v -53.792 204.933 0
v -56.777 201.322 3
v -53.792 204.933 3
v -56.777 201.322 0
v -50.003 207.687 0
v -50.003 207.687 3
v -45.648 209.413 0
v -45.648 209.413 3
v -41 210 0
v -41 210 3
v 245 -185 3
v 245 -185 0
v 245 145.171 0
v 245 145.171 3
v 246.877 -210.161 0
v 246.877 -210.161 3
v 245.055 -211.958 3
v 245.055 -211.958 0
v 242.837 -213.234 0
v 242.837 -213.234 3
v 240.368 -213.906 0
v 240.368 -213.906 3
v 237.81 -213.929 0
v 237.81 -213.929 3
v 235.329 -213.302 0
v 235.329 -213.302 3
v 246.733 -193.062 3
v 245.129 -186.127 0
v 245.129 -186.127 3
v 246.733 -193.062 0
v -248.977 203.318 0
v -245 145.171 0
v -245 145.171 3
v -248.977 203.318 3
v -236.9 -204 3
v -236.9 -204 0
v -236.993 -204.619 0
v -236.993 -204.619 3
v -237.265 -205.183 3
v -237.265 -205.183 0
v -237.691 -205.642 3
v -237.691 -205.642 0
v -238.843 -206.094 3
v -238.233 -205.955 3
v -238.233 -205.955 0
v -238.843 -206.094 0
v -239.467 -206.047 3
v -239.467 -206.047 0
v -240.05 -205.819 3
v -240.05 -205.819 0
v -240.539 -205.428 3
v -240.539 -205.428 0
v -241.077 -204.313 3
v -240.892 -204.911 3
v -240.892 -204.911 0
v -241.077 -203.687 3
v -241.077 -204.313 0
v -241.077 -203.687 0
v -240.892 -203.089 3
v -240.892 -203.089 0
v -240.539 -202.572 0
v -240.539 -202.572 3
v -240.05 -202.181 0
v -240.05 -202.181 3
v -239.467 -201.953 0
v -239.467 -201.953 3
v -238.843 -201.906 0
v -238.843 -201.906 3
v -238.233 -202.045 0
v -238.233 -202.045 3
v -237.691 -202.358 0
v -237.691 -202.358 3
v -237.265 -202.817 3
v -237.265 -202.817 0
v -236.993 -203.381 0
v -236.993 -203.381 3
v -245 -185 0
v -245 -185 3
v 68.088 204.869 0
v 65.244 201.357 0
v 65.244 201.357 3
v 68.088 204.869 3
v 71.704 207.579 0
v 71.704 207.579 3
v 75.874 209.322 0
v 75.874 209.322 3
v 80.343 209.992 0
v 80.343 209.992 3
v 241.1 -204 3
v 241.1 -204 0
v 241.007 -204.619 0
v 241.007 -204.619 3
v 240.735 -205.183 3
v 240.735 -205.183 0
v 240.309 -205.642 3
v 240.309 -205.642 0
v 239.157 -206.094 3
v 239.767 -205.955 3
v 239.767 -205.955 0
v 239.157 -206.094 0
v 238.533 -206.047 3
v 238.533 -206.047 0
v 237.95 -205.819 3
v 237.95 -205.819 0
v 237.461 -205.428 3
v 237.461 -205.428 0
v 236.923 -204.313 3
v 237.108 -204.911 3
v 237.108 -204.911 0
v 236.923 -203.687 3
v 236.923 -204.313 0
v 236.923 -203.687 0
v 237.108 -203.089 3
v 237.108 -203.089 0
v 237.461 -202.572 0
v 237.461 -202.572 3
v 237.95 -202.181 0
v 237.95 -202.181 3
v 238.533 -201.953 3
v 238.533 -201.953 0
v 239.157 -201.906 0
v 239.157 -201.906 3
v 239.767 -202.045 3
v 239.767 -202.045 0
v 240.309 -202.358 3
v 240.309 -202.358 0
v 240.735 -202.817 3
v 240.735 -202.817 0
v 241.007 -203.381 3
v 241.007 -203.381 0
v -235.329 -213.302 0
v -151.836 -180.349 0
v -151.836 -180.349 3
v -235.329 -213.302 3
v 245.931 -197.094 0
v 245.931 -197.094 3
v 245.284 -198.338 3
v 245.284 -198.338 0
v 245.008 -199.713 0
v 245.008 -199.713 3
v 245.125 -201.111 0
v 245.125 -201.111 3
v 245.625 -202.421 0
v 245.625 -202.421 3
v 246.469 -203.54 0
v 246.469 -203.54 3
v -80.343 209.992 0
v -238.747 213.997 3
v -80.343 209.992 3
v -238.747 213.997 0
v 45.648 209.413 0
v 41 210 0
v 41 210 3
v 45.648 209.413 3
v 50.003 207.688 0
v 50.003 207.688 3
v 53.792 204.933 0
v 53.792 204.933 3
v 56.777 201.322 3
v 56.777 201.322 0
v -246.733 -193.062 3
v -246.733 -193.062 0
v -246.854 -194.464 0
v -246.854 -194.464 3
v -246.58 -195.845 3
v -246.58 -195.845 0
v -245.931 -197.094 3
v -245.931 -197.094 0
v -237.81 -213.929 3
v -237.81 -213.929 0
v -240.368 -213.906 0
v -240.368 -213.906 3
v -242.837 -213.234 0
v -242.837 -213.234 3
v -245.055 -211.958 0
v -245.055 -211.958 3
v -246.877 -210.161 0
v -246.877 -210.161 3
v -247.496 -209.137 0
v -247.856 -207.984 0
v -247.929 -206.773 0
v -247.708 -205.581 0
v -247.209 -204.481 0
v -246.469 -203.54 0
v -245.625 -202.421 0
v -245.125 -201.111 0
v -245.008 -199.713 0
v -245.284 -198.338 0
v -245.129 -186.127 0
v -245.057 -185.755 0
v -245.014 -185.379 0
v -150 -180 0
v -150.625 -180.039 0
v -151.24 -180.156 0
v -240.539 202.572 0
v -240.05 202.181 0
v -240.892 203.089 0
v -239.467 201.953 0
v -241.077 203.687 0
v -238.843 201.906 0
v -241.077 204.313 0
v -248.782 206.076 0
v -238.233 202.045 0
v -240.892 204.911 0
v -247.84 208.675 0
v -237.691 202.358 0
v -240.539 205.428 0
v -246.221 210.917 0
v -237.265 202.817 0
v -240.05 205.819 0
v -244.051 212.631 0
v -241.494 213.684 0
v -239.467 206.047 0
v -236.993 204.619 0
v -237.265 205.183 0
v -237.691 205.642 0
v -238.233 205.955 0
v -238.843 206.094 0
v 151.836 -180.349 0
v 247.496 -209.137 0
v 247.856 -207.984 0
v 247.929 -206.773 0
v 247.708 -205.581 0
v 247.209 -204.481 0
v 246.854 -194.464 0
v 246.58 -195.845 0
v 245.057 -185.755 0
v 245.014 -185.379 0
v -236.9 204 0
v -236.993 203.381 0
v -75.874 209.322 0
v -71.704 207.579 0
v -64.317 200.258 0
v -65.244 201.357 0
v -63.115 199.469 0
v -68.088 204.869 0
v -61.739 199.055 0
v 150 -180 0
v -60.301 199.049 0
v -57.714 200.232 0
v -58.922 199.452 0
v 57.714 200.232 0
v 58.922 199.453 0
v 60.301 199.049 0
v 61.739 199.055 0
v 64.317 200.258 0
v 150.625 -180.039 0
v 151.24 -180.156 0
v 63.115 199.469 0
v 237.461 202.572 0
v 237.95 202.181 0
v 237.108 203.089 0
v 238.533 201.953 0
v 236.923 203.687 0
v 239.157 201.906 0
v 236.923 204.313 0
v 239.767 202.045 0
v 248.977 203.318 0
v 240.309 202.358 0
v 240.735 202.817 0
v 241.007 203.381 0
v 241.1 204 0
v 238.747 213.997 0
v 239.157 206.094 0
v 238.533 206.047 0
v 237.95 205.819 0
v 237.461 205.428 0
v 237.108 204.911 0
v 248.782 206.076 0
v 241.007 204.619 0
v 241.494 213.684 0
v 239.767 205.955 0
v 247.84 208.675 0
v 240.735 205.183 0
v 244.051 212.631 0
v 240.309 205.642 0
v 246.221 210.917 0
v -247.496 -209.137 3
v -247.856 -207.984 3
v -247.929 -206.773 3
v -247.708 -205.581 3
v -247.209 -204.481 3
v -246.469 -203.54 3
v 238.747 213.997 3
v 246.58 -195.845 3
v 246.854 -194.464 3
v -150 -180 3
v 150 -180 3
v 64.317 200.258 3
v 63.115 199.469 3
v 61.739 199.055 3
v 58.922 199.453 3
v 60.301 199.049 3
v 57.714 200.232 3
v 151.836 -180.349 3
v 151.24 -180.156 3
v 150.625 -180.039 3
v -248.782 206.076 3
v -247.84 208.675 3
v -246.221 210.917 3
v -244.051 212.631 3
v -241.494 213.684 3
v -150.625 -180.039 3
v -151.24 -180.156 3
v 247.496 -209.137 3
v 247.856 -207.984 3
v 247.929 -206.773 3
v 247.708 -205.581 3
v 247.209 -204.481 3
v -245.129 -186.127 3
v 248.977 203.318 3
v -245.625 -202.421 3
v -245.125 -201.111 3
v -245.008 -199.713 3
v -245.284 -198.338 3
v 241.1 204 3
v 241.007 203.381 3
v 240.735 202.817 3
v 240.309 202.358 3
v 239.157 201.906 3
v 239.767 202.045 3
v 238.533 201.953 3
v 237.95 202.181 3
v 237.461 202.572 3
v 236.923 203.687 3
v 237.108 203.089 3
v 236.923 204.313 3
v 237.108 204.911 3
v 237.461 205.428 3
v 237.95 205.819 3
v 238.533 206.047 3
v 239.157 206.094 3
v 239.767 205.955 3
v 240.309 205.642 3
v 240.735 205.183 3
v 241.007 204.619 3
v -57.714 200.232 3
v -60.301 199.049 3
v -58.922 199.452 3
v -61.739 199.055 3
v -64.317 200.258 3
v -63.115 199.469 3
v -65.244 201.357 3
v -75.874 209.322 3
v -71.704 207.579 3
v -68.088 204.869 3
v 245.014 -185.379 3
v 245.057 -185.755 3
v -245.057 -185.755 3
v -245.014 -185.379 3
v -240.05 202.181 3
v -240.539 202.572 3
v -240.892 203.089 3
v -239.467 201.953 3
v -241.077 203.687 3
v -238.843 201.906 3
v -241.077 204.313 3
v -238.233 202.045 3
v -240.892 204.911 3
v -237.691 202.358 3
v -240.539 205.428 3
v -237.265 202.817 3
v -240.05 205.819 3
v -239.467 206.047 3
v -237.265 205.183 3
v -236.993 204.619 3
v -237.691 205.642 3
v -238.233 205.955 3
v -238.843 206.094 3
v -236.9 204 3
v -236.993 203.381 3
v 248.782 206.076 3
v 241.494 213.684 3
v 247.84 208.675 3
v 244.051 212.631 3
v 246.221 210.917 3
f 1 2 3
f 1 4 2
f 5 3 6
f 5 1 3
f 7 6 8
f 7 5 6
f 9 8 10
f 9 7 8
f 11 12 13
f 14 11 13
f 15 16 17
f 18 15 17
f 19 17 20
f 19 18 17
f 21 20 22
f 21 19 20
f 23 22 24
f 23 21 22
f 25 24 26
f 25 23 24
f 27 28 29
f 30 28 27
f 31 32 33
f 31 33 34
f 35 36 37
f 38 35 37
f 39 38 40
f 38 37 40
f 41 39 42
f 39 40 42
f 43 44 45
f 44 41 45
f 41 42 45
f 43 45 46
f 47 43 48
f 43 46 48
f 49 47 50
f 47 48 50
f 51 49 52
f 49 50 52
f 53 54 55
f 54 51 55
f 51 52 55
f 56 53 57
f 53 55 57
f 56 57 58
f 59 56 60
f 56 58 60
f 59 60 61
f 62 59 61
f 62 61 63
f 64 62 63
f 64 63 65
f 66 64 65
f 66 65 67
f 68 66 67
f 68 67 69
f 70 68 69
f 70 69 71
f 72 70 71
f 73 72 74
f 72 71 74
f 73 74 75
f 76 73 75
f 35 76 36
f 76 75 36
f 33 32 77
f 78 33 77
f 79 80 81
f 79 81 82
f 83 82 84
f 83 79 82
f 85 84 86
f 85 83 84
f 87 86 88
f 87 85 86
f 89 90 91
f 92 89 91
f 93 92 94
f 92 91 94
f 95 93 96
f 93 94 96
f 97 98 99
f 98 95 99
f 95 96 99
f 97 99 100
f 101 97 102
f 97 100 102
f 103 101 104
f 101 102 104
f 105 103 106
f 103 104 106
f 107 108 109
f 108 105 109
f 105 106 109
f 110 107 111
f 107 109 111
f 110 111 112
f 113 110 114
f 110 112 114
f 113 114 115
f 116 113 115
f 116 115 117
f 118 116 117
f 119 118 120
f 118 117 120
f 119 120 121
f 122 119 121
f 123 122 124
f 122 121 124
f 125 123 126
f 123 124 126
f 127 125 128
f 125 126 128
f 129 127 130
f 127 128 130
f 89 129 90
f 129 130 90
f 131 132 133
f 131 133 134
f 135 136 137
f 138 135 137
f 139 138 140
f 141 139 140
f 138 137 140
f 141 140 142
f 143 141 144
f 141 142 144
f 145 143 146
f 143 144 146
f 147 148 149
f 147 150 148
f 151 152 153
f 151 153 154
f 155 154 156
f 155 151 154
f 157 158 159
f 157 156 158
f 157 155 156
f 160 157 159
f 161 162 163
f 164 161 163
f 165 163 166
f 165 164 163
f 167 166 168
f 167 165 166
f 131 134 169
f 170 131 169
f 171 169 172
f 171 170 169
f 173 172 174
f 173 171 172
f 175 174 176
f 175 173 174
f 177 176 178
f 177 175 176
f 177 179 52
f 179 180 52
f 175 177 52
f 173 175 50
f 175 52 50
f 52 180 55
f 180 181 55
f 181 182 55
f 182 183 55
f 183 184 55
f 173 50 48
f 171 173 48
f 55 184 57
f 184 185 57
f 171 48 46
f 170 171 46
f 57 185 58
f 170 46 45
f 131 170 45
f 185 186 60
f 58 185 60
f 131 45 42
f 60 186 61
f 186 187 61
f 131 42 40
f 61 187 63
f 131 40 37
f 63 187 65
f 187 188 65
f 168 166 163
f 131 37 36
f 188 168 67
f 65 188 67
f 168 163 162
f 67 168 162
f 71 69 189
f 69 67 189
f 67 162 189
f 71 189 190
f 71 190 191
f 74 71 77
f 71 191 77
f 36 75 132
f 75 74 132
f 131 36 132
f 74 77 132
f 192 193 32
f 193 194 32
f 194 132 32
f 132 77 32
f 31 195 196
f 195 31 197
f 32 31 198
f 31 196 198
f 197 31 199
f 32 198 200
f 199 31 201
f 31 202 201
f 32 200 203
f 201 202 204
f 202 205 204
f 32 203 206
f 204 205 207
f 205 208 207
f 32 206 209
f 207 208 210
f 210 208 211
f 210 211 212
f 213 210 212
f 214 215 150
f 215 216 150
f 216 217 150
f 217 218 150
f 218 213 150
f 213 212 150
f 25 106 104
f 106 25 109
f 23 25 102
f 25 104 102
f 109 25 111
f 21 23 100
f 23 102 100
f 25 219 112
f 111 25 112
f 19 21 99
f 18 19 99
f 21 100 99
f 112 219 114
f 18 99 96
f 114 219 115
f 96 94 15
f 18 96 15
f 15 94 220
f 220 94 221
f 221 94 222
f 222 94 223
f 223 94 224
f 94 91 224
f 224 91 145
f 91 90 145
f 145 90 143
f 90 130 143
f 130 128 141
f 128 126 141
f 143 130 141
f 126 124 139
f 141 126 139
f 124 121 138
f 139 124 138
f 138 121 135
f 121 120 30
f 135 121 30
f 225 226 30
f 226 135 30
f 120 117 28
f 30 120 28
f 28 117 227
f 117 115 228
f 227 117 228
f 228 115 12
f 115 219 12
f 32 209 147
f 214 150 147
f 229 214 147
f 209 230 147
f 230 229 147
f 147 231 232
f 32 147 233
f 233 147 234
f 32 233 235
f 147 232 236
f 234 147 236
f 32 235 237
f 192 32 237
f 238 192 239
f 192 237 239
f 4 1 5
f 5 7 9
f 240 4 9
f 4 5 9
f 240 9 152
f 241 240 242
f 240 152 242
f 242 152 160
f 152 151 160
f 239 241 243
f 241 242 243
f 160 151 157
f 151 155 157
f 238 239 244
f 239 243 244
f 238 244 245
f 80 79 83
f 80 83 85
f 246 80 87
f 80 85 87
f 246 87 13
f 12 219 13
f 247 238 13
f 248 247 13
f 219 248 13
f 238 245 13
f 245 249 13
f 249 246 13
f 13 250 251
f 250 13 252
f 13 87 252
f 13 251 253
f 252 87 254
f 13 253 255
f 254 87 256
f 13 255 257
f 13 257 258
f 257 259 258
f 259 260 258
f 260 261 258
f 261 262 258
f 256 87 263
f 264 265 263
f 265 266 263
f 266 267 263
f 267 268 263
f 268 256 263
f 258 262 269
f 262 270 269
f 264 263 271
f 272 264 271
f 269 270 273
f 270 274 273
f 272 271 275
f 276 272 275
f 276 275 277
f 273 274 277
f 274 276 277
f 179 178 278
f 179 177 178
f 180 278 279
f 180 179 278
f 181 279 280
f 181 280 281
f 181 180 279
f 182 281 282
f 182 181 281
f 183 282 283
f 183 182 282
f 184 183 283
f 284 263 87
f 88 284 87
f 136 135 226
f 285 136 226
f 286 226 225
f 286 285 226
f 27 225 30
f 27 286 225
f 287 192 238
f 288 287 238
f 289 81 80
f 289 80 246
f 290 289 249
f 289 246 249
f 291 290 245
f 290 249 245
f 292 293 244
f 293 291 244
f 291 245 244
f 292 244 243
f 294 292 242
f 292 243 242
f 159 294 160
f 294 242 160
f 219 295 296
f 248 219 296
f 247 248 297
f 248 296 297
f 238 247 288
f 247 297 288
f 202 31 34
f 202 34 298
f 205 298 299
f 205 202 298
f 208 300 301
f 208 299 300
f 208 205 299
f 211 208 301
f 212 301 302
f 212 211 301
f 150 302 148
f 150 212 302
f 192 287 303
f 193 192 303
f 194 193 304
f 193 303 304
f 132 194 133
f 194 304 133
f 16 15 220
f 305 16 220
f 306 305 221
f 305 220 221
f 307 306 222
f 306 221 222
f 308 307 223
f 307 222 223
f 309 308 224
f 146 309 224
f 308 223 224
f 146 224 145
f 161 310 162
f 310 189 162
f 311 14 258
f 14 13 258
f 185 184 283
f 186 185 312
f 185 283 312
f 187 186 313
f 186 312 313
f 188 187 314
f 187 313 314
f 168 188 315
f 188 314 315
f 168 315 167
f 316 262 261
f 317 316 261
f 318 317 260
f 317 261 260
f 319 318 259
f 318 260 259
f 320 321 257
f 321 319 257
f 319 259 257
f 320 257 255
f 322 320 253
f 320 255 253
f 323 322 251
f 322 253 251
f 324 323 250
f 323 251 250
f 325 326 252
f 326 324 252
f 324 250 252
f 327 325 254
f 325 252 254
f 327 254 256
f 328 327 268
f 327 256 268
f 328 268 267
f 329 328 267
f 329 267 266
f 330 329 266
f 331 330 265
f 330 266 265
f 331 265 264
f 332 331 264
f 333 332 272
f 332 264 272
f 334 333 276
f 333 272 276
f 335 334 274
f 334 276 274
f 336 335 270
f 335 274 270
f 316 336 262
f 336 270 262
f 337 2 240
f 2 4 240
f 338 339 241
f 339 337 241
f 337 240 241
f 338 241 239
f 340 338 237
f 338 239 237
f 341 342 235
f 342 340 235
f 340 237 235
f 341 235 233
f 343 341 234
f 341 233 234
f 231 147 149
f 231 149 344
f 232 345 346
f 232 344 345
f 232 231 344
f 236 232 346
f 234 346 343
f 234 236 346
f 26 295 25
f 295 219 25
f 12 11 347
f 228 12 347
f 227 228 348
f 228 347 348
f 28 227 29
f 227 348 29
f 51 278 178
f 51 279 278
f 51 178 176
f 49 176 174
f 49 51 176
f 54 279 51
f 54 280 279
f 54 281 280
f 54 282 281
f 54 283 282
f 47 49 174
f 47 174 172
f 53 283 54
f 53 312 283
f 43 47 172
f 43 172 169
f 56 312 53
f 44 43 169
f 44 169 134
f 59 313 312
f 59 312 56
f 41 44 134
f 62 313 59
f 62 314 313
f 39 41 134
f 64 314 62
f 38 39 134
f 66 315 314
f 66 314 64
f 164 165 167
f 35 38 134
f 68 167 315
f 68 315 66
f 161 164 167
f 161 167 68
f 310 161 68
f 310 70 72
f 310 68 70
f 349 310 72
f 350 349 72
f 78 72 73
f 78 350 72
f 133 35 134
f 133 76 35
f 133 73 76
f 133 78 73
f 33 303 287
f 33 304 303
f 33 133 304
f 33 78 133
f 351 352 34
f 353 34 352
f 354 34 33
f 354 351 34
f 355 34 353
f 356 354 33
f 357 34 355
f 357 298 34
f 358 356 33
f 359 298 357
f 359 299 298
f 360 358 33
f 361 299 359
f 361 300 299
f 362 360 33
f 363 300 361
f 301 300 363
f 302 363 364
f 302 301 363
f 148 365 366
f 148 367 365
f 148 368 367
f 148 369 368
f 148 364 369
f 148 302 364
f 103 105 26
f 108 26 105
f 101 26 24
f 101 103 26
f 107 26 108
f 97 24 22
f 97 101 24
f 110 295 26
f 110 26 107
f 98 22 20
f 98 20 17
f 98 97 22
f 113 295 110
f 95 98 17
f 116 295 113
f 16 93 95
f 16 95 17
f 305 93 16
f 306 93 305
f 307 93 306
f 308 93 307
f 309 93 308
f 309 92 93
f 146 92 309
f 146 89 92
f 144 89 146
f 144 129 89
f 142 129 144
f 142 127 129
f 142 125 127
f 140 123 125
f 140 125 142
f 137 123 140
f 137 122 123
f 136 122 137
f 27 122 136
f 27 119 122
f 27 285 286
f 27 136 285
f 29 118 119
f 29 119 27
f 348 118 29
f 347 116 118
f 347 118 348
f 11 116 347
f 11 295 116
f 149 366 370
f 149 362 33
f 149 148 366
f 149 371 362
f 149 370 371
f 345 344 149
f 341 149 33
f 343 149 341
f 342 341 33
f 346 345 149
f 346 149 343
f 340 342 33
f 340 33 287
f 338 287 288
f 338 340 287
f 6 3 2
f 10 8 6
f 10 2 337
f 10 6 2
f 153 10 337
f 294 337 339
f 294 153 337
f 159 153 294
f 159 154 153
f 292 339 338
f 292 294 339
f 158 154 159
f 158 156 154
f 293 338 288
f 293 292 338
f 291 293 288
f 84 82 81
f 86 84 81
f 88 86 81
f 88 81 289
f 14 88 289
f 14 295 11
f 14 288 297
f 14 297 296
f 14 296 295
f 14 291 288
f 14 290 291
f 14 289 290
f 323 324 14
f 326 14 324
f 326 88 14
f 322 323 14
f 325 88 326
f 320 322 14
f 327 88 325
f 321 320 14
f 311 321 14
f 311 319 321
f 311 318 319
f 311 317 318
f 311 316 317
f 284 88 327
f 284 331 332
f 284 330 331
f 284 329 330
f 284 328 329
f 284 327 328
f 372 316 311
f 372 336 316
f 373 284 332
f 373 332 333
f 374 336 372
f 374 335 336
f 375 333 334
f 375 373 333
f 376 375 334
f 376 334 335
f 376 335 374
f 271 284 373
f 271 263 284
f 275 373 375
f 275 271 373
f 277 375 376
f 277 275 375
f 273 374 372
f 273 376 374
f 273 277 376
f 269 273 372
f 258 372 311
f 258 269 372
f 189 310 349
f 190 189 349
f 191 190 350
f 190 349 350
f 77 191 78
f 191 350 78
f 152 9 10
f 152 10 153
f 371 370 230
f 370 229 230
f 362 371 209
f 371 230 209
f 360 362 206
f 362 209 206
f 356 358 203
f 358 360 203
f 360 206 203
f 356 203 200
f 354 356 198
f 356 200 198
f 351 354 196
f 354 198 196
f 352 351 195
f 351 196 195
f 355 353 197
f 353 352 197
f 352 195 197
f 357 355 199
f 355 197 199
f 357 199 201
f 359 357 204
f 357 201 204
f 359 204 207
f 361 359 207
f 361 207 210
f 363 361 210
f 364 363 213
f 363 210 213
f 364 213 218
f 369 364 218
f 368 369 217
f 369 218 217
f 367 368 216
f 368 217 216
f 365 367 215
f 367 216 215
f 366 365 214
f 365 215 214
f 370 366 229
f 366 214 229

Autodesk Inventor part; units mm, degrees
ref_plane "YZ Plane" through (0, 0, 0) normal (1, 0, 0) x (0, 1, 0)
ref_plane "XZ Plane" through (0, 0, 0) normal (0, 1, 0) x (-1, 0, 0)
ref_plane "XY Plane" through (0, 0, 0) normal (0, 0, 1) x (1, 0, 0)
sketch "スケッチ1" plane through (0, 0, 0) normal (0, 0, 1) x (1, 0, 0)
  circle A0 centre (-239, 204) radius 2.1 construction
  circle A1 centre (-239, -204) radius 2.1 construction
  circle A2 centre (239, -204) radius 2.1 construction
  circle A3 centre (239, 204) radius 2.1 construction
  circle A4 centre (-61, 204) radius 2.1 construction
  circle A5 centre (61, 204) radius 2.1 construction
  circle A6 centre (-50, -185) radius 2.1 construction
  circle A7 centre (-161.1336, -215) radius 2.1 construction
  circle A8 centre (50, -185) radius 2.1 construction
  circle A9 centre (150, -185) radius 2.1 construction
  circle A10 centre (161.1336, -215) radius 2.1 construction
  circle A11 centre (250, -185) radius 1.6 construction
  circle A12 centre (250, -215) radius 1.6 construction
  line L0 (239, 184) -> (239, -154) construction
  arc A13 (239, 184) -> (219, 204) centre (219, 184) ccw construction
  arc A14 (219, -174) -> (239, -154) centre (219, -154) ccw construction
  line L1 (219, -174) -> (-219, -174) construction
  line L2 (81, 204) -> (219, 204) construction
  line L3 (-239, -154) -> (-239, 184) construction
  arc A15 (-239, -154) -> (-219, -174) centre (-219, -154) ccw construction
  arc A16 (-219, 204) -> (-239, 184) centre (-219, 184) ccw construction
  line L4 (-219, 204) -> (-81, 204) construction
  arc A17 (-66.8579, 198.1421) -> (-55.1421, 198.1421) centre (-61, 204) ccw construction
  arc A18 (-66.8579, 198.1421) -> (-81, 204) centre (-81, 184) ccw construction
  arc A19 (-41, 204) -> (-55.1421, 198.1421) centre (-41, 184) ccw construction
  line L5 (-41, 204) -> (41, 204) construction
  arc A20 (55.1421, 198.1421) -> (41, 204) centre (41, 184) ccw construction
  arc A21 (55.1421, 198.1421) -> (66.8579, 198.1421) centre (61, 204) ccw construction
  arc A22 (81, 204) -> (66.8579, 198.1421) centre (81, 184) ccw construction
  circle A23 centre (-250, -215) radius 2.1 construction
  circle A24 centre (-239, 204) radius 10 construction
  circle A25 centre (-250, 215) radius 1.6 construction
  circle A26 centre (-250, 215) radius 5 construction
  circle A27 centre (-239, -204) radius 10 construction
  circle A28 centre (239, -204) radius 10 construction
  circle A29 centre (239, 204) radius 10 construction
  line L6 (245, -154) -> (245, 184) construction
  arc A30 (245, 184) -> (219, 210) centre (219, 184) ccw construction
  line L7 (219, 210) -> (81, 210) construction
  arc A31 (81, 210) -> (62.6152, 202.3848) centre (81, 184) ccw construction
  arc A32 (59.3848, 202.3848) -> (62.6152, 202.3848) centre (61, 204) ccw construction
  arc A33 (59.3848, 202.3848) -> (41, 210) centre (41, 184) ccw construction
  line L8 (41, 210) -> (-41, 210) construction
  arc A34 (-41, 210) -> (-59.3848, 202.3848) centre (-41, 184) ccw construction
  arc A35 (-62.6152, 202.3848) -> (-59.3848, 202.3848) centre (-61, 204) ccw construction
  arc A36 (-62.6152, 202.3848) -> (-81, 210) centre (-81, 184) ccw construction
  line L9 (-81, 210) -> (-219, 210) construction
  arc A37 (-219, 210) -> (-245, 184) centre (-219, 184) ccw construction
  line L10 (-245, 184) -> (-245, -154) construction
  arc A38 (-245, -154) -> (-219, -180) centre (-219, -154) ccw construction
  line L11 (-219, -180) -> (219, -180) construction
  arc A39 (219, -180) -> (245, -154) centre (219, -154) ccw construction
  circle A40 centre (250, -185) radius 5 construction
  circle A41 centre (250, 145) radius 2.1 construction
  circle A42 centre (250, 145) radius 5 construction
  circle A43 centre (150, -185) radius 5 construction
  circle A44 centre (61, 204) radius 5 construction
  line L12 (150.951, -180) -> (235.3288, -213.3018)
  line L13 (245, -154) -> (245, -185.5709)
  line L14 (245, -185.5709) -> (248.7426, -201.7457)
  arc A45 (235.3288, -213.3018) -> (248.7426, -201.7457) centre (239, -204) ccw
  line L15 (0, -174) -> (0, 204) construction
  line L16 (245, 145.1708) -> (248.9767, 203.3177)
  line L17 (238.7472, 213.9968) -> (80.3428, 209.9917)
  arc A46 (80.3428, 209.9917) -> (65.2441, 201.3566) centre (80.8062, 191.6636) ccw
  arc A47 (56.7774, 201.3225) -> (41, 210) centre (41, 191.3182) ccw
  arc A48 (56.7774, 201.3225) -> (65.2441, 201.3566) centre (61, 204) ccw
  line L18 (245, -154) -> (245, 145.1708)
  arc A49 (248.9767, 203.3177) -> (238.7472, 213.9968) centre (239, 204) ccw
  line L19 (-150.951, -180) -> (-235.3288, -213.3018)
  line L20 (-245, -154) -> (-245, -185.5709)
  line L21 (-245, -185.5709) -> (-248.7426, -201.7457)
  arc A50 (-248.7426, -201.7457) -> (-235.3288, -213.3018) centre (-239, -204) ccw
  line L22 (-245, 145.1708) -> (-248.9767, 203.3177)
  line L23 (-238.7472, 213.9968) -> (-80.3428, 209.9917)
  arc A51 (-65.2441, 201.3566) -> (-80.3428, 209.9917) centre (-80.8062, 191.6636) ccw
  arc A52 (-41, 210) -> (-56.7774, 201.3225) centre (-41, 191.3182) ccw
  arc A53 (-65.2441, 201.3566) -> (-56.7774, 201.3225) centre (-61, 204) ccw
  line L24 (-245, -154) -> (-245, 145.1708)
  arc A54 (-238.7472, 213.9968) -> (-248.9767, 203.3177) centre (-239, 204) ccw
  line L25 (-150.951, -180) -> (150.951, -180)
  line L26 (-41, 210) -> (41, 210)
  circle A55 centre (-239, -204) radius 2.1
  circle A56 centre (-239, 204) radius 2.1
  circle A57 centre (239, 204) radius 2.1
  circle A58 centre (239, -204) radius 2.1
  point P0 (0, 0)
  dimension "d0" = 20
  dimension "d1" = 10
  dimension "d2" = 6
  dimension "d3" = 10
  dimension "d4" = 4.2
extrude "押し出し1" add sketch "スケッチ1" along normal blind 3
sketch "スケッチ2" plane through (0, 0, 3) normal (0, 0, 1) x (1, 0, 0)
  circle A0 centre (-250, -200) radius 2.1 construction
  circle A1 centre (-250, -200) radius 5
  line L0 (41, 210) -> (-41, 210) construction
  line L1 (-150.951, -180) -> (150.951, -180) construction
  line L2 (0, 210) -> (0, -180) construction
  circle A2 centre (250, -200) radius 5
  point P0 (0, 0)
  dimension "d7" = 10
extrude "押し出し2" cut sketch "スケッチ2" against normal through all
fillet "フィレット1" radius 5 10 edges at (248.9603, -204.8907, 1.5) (247.3566, -195.7559, 1.5) (245, -185.5709, 1.5) (150.951, -180, 1.5) (245, 145.1708, 1.5) (-245, 145.1708, 1.5) (-245, -185.5709, 1.5) (-247.3566, -195.7559, 1.5) (-248.9603, -204.8907, 1.5) (-150.951, -180, 1.5)
properties part number "left_plate_02" material "ポリカーボネート、クリア"
